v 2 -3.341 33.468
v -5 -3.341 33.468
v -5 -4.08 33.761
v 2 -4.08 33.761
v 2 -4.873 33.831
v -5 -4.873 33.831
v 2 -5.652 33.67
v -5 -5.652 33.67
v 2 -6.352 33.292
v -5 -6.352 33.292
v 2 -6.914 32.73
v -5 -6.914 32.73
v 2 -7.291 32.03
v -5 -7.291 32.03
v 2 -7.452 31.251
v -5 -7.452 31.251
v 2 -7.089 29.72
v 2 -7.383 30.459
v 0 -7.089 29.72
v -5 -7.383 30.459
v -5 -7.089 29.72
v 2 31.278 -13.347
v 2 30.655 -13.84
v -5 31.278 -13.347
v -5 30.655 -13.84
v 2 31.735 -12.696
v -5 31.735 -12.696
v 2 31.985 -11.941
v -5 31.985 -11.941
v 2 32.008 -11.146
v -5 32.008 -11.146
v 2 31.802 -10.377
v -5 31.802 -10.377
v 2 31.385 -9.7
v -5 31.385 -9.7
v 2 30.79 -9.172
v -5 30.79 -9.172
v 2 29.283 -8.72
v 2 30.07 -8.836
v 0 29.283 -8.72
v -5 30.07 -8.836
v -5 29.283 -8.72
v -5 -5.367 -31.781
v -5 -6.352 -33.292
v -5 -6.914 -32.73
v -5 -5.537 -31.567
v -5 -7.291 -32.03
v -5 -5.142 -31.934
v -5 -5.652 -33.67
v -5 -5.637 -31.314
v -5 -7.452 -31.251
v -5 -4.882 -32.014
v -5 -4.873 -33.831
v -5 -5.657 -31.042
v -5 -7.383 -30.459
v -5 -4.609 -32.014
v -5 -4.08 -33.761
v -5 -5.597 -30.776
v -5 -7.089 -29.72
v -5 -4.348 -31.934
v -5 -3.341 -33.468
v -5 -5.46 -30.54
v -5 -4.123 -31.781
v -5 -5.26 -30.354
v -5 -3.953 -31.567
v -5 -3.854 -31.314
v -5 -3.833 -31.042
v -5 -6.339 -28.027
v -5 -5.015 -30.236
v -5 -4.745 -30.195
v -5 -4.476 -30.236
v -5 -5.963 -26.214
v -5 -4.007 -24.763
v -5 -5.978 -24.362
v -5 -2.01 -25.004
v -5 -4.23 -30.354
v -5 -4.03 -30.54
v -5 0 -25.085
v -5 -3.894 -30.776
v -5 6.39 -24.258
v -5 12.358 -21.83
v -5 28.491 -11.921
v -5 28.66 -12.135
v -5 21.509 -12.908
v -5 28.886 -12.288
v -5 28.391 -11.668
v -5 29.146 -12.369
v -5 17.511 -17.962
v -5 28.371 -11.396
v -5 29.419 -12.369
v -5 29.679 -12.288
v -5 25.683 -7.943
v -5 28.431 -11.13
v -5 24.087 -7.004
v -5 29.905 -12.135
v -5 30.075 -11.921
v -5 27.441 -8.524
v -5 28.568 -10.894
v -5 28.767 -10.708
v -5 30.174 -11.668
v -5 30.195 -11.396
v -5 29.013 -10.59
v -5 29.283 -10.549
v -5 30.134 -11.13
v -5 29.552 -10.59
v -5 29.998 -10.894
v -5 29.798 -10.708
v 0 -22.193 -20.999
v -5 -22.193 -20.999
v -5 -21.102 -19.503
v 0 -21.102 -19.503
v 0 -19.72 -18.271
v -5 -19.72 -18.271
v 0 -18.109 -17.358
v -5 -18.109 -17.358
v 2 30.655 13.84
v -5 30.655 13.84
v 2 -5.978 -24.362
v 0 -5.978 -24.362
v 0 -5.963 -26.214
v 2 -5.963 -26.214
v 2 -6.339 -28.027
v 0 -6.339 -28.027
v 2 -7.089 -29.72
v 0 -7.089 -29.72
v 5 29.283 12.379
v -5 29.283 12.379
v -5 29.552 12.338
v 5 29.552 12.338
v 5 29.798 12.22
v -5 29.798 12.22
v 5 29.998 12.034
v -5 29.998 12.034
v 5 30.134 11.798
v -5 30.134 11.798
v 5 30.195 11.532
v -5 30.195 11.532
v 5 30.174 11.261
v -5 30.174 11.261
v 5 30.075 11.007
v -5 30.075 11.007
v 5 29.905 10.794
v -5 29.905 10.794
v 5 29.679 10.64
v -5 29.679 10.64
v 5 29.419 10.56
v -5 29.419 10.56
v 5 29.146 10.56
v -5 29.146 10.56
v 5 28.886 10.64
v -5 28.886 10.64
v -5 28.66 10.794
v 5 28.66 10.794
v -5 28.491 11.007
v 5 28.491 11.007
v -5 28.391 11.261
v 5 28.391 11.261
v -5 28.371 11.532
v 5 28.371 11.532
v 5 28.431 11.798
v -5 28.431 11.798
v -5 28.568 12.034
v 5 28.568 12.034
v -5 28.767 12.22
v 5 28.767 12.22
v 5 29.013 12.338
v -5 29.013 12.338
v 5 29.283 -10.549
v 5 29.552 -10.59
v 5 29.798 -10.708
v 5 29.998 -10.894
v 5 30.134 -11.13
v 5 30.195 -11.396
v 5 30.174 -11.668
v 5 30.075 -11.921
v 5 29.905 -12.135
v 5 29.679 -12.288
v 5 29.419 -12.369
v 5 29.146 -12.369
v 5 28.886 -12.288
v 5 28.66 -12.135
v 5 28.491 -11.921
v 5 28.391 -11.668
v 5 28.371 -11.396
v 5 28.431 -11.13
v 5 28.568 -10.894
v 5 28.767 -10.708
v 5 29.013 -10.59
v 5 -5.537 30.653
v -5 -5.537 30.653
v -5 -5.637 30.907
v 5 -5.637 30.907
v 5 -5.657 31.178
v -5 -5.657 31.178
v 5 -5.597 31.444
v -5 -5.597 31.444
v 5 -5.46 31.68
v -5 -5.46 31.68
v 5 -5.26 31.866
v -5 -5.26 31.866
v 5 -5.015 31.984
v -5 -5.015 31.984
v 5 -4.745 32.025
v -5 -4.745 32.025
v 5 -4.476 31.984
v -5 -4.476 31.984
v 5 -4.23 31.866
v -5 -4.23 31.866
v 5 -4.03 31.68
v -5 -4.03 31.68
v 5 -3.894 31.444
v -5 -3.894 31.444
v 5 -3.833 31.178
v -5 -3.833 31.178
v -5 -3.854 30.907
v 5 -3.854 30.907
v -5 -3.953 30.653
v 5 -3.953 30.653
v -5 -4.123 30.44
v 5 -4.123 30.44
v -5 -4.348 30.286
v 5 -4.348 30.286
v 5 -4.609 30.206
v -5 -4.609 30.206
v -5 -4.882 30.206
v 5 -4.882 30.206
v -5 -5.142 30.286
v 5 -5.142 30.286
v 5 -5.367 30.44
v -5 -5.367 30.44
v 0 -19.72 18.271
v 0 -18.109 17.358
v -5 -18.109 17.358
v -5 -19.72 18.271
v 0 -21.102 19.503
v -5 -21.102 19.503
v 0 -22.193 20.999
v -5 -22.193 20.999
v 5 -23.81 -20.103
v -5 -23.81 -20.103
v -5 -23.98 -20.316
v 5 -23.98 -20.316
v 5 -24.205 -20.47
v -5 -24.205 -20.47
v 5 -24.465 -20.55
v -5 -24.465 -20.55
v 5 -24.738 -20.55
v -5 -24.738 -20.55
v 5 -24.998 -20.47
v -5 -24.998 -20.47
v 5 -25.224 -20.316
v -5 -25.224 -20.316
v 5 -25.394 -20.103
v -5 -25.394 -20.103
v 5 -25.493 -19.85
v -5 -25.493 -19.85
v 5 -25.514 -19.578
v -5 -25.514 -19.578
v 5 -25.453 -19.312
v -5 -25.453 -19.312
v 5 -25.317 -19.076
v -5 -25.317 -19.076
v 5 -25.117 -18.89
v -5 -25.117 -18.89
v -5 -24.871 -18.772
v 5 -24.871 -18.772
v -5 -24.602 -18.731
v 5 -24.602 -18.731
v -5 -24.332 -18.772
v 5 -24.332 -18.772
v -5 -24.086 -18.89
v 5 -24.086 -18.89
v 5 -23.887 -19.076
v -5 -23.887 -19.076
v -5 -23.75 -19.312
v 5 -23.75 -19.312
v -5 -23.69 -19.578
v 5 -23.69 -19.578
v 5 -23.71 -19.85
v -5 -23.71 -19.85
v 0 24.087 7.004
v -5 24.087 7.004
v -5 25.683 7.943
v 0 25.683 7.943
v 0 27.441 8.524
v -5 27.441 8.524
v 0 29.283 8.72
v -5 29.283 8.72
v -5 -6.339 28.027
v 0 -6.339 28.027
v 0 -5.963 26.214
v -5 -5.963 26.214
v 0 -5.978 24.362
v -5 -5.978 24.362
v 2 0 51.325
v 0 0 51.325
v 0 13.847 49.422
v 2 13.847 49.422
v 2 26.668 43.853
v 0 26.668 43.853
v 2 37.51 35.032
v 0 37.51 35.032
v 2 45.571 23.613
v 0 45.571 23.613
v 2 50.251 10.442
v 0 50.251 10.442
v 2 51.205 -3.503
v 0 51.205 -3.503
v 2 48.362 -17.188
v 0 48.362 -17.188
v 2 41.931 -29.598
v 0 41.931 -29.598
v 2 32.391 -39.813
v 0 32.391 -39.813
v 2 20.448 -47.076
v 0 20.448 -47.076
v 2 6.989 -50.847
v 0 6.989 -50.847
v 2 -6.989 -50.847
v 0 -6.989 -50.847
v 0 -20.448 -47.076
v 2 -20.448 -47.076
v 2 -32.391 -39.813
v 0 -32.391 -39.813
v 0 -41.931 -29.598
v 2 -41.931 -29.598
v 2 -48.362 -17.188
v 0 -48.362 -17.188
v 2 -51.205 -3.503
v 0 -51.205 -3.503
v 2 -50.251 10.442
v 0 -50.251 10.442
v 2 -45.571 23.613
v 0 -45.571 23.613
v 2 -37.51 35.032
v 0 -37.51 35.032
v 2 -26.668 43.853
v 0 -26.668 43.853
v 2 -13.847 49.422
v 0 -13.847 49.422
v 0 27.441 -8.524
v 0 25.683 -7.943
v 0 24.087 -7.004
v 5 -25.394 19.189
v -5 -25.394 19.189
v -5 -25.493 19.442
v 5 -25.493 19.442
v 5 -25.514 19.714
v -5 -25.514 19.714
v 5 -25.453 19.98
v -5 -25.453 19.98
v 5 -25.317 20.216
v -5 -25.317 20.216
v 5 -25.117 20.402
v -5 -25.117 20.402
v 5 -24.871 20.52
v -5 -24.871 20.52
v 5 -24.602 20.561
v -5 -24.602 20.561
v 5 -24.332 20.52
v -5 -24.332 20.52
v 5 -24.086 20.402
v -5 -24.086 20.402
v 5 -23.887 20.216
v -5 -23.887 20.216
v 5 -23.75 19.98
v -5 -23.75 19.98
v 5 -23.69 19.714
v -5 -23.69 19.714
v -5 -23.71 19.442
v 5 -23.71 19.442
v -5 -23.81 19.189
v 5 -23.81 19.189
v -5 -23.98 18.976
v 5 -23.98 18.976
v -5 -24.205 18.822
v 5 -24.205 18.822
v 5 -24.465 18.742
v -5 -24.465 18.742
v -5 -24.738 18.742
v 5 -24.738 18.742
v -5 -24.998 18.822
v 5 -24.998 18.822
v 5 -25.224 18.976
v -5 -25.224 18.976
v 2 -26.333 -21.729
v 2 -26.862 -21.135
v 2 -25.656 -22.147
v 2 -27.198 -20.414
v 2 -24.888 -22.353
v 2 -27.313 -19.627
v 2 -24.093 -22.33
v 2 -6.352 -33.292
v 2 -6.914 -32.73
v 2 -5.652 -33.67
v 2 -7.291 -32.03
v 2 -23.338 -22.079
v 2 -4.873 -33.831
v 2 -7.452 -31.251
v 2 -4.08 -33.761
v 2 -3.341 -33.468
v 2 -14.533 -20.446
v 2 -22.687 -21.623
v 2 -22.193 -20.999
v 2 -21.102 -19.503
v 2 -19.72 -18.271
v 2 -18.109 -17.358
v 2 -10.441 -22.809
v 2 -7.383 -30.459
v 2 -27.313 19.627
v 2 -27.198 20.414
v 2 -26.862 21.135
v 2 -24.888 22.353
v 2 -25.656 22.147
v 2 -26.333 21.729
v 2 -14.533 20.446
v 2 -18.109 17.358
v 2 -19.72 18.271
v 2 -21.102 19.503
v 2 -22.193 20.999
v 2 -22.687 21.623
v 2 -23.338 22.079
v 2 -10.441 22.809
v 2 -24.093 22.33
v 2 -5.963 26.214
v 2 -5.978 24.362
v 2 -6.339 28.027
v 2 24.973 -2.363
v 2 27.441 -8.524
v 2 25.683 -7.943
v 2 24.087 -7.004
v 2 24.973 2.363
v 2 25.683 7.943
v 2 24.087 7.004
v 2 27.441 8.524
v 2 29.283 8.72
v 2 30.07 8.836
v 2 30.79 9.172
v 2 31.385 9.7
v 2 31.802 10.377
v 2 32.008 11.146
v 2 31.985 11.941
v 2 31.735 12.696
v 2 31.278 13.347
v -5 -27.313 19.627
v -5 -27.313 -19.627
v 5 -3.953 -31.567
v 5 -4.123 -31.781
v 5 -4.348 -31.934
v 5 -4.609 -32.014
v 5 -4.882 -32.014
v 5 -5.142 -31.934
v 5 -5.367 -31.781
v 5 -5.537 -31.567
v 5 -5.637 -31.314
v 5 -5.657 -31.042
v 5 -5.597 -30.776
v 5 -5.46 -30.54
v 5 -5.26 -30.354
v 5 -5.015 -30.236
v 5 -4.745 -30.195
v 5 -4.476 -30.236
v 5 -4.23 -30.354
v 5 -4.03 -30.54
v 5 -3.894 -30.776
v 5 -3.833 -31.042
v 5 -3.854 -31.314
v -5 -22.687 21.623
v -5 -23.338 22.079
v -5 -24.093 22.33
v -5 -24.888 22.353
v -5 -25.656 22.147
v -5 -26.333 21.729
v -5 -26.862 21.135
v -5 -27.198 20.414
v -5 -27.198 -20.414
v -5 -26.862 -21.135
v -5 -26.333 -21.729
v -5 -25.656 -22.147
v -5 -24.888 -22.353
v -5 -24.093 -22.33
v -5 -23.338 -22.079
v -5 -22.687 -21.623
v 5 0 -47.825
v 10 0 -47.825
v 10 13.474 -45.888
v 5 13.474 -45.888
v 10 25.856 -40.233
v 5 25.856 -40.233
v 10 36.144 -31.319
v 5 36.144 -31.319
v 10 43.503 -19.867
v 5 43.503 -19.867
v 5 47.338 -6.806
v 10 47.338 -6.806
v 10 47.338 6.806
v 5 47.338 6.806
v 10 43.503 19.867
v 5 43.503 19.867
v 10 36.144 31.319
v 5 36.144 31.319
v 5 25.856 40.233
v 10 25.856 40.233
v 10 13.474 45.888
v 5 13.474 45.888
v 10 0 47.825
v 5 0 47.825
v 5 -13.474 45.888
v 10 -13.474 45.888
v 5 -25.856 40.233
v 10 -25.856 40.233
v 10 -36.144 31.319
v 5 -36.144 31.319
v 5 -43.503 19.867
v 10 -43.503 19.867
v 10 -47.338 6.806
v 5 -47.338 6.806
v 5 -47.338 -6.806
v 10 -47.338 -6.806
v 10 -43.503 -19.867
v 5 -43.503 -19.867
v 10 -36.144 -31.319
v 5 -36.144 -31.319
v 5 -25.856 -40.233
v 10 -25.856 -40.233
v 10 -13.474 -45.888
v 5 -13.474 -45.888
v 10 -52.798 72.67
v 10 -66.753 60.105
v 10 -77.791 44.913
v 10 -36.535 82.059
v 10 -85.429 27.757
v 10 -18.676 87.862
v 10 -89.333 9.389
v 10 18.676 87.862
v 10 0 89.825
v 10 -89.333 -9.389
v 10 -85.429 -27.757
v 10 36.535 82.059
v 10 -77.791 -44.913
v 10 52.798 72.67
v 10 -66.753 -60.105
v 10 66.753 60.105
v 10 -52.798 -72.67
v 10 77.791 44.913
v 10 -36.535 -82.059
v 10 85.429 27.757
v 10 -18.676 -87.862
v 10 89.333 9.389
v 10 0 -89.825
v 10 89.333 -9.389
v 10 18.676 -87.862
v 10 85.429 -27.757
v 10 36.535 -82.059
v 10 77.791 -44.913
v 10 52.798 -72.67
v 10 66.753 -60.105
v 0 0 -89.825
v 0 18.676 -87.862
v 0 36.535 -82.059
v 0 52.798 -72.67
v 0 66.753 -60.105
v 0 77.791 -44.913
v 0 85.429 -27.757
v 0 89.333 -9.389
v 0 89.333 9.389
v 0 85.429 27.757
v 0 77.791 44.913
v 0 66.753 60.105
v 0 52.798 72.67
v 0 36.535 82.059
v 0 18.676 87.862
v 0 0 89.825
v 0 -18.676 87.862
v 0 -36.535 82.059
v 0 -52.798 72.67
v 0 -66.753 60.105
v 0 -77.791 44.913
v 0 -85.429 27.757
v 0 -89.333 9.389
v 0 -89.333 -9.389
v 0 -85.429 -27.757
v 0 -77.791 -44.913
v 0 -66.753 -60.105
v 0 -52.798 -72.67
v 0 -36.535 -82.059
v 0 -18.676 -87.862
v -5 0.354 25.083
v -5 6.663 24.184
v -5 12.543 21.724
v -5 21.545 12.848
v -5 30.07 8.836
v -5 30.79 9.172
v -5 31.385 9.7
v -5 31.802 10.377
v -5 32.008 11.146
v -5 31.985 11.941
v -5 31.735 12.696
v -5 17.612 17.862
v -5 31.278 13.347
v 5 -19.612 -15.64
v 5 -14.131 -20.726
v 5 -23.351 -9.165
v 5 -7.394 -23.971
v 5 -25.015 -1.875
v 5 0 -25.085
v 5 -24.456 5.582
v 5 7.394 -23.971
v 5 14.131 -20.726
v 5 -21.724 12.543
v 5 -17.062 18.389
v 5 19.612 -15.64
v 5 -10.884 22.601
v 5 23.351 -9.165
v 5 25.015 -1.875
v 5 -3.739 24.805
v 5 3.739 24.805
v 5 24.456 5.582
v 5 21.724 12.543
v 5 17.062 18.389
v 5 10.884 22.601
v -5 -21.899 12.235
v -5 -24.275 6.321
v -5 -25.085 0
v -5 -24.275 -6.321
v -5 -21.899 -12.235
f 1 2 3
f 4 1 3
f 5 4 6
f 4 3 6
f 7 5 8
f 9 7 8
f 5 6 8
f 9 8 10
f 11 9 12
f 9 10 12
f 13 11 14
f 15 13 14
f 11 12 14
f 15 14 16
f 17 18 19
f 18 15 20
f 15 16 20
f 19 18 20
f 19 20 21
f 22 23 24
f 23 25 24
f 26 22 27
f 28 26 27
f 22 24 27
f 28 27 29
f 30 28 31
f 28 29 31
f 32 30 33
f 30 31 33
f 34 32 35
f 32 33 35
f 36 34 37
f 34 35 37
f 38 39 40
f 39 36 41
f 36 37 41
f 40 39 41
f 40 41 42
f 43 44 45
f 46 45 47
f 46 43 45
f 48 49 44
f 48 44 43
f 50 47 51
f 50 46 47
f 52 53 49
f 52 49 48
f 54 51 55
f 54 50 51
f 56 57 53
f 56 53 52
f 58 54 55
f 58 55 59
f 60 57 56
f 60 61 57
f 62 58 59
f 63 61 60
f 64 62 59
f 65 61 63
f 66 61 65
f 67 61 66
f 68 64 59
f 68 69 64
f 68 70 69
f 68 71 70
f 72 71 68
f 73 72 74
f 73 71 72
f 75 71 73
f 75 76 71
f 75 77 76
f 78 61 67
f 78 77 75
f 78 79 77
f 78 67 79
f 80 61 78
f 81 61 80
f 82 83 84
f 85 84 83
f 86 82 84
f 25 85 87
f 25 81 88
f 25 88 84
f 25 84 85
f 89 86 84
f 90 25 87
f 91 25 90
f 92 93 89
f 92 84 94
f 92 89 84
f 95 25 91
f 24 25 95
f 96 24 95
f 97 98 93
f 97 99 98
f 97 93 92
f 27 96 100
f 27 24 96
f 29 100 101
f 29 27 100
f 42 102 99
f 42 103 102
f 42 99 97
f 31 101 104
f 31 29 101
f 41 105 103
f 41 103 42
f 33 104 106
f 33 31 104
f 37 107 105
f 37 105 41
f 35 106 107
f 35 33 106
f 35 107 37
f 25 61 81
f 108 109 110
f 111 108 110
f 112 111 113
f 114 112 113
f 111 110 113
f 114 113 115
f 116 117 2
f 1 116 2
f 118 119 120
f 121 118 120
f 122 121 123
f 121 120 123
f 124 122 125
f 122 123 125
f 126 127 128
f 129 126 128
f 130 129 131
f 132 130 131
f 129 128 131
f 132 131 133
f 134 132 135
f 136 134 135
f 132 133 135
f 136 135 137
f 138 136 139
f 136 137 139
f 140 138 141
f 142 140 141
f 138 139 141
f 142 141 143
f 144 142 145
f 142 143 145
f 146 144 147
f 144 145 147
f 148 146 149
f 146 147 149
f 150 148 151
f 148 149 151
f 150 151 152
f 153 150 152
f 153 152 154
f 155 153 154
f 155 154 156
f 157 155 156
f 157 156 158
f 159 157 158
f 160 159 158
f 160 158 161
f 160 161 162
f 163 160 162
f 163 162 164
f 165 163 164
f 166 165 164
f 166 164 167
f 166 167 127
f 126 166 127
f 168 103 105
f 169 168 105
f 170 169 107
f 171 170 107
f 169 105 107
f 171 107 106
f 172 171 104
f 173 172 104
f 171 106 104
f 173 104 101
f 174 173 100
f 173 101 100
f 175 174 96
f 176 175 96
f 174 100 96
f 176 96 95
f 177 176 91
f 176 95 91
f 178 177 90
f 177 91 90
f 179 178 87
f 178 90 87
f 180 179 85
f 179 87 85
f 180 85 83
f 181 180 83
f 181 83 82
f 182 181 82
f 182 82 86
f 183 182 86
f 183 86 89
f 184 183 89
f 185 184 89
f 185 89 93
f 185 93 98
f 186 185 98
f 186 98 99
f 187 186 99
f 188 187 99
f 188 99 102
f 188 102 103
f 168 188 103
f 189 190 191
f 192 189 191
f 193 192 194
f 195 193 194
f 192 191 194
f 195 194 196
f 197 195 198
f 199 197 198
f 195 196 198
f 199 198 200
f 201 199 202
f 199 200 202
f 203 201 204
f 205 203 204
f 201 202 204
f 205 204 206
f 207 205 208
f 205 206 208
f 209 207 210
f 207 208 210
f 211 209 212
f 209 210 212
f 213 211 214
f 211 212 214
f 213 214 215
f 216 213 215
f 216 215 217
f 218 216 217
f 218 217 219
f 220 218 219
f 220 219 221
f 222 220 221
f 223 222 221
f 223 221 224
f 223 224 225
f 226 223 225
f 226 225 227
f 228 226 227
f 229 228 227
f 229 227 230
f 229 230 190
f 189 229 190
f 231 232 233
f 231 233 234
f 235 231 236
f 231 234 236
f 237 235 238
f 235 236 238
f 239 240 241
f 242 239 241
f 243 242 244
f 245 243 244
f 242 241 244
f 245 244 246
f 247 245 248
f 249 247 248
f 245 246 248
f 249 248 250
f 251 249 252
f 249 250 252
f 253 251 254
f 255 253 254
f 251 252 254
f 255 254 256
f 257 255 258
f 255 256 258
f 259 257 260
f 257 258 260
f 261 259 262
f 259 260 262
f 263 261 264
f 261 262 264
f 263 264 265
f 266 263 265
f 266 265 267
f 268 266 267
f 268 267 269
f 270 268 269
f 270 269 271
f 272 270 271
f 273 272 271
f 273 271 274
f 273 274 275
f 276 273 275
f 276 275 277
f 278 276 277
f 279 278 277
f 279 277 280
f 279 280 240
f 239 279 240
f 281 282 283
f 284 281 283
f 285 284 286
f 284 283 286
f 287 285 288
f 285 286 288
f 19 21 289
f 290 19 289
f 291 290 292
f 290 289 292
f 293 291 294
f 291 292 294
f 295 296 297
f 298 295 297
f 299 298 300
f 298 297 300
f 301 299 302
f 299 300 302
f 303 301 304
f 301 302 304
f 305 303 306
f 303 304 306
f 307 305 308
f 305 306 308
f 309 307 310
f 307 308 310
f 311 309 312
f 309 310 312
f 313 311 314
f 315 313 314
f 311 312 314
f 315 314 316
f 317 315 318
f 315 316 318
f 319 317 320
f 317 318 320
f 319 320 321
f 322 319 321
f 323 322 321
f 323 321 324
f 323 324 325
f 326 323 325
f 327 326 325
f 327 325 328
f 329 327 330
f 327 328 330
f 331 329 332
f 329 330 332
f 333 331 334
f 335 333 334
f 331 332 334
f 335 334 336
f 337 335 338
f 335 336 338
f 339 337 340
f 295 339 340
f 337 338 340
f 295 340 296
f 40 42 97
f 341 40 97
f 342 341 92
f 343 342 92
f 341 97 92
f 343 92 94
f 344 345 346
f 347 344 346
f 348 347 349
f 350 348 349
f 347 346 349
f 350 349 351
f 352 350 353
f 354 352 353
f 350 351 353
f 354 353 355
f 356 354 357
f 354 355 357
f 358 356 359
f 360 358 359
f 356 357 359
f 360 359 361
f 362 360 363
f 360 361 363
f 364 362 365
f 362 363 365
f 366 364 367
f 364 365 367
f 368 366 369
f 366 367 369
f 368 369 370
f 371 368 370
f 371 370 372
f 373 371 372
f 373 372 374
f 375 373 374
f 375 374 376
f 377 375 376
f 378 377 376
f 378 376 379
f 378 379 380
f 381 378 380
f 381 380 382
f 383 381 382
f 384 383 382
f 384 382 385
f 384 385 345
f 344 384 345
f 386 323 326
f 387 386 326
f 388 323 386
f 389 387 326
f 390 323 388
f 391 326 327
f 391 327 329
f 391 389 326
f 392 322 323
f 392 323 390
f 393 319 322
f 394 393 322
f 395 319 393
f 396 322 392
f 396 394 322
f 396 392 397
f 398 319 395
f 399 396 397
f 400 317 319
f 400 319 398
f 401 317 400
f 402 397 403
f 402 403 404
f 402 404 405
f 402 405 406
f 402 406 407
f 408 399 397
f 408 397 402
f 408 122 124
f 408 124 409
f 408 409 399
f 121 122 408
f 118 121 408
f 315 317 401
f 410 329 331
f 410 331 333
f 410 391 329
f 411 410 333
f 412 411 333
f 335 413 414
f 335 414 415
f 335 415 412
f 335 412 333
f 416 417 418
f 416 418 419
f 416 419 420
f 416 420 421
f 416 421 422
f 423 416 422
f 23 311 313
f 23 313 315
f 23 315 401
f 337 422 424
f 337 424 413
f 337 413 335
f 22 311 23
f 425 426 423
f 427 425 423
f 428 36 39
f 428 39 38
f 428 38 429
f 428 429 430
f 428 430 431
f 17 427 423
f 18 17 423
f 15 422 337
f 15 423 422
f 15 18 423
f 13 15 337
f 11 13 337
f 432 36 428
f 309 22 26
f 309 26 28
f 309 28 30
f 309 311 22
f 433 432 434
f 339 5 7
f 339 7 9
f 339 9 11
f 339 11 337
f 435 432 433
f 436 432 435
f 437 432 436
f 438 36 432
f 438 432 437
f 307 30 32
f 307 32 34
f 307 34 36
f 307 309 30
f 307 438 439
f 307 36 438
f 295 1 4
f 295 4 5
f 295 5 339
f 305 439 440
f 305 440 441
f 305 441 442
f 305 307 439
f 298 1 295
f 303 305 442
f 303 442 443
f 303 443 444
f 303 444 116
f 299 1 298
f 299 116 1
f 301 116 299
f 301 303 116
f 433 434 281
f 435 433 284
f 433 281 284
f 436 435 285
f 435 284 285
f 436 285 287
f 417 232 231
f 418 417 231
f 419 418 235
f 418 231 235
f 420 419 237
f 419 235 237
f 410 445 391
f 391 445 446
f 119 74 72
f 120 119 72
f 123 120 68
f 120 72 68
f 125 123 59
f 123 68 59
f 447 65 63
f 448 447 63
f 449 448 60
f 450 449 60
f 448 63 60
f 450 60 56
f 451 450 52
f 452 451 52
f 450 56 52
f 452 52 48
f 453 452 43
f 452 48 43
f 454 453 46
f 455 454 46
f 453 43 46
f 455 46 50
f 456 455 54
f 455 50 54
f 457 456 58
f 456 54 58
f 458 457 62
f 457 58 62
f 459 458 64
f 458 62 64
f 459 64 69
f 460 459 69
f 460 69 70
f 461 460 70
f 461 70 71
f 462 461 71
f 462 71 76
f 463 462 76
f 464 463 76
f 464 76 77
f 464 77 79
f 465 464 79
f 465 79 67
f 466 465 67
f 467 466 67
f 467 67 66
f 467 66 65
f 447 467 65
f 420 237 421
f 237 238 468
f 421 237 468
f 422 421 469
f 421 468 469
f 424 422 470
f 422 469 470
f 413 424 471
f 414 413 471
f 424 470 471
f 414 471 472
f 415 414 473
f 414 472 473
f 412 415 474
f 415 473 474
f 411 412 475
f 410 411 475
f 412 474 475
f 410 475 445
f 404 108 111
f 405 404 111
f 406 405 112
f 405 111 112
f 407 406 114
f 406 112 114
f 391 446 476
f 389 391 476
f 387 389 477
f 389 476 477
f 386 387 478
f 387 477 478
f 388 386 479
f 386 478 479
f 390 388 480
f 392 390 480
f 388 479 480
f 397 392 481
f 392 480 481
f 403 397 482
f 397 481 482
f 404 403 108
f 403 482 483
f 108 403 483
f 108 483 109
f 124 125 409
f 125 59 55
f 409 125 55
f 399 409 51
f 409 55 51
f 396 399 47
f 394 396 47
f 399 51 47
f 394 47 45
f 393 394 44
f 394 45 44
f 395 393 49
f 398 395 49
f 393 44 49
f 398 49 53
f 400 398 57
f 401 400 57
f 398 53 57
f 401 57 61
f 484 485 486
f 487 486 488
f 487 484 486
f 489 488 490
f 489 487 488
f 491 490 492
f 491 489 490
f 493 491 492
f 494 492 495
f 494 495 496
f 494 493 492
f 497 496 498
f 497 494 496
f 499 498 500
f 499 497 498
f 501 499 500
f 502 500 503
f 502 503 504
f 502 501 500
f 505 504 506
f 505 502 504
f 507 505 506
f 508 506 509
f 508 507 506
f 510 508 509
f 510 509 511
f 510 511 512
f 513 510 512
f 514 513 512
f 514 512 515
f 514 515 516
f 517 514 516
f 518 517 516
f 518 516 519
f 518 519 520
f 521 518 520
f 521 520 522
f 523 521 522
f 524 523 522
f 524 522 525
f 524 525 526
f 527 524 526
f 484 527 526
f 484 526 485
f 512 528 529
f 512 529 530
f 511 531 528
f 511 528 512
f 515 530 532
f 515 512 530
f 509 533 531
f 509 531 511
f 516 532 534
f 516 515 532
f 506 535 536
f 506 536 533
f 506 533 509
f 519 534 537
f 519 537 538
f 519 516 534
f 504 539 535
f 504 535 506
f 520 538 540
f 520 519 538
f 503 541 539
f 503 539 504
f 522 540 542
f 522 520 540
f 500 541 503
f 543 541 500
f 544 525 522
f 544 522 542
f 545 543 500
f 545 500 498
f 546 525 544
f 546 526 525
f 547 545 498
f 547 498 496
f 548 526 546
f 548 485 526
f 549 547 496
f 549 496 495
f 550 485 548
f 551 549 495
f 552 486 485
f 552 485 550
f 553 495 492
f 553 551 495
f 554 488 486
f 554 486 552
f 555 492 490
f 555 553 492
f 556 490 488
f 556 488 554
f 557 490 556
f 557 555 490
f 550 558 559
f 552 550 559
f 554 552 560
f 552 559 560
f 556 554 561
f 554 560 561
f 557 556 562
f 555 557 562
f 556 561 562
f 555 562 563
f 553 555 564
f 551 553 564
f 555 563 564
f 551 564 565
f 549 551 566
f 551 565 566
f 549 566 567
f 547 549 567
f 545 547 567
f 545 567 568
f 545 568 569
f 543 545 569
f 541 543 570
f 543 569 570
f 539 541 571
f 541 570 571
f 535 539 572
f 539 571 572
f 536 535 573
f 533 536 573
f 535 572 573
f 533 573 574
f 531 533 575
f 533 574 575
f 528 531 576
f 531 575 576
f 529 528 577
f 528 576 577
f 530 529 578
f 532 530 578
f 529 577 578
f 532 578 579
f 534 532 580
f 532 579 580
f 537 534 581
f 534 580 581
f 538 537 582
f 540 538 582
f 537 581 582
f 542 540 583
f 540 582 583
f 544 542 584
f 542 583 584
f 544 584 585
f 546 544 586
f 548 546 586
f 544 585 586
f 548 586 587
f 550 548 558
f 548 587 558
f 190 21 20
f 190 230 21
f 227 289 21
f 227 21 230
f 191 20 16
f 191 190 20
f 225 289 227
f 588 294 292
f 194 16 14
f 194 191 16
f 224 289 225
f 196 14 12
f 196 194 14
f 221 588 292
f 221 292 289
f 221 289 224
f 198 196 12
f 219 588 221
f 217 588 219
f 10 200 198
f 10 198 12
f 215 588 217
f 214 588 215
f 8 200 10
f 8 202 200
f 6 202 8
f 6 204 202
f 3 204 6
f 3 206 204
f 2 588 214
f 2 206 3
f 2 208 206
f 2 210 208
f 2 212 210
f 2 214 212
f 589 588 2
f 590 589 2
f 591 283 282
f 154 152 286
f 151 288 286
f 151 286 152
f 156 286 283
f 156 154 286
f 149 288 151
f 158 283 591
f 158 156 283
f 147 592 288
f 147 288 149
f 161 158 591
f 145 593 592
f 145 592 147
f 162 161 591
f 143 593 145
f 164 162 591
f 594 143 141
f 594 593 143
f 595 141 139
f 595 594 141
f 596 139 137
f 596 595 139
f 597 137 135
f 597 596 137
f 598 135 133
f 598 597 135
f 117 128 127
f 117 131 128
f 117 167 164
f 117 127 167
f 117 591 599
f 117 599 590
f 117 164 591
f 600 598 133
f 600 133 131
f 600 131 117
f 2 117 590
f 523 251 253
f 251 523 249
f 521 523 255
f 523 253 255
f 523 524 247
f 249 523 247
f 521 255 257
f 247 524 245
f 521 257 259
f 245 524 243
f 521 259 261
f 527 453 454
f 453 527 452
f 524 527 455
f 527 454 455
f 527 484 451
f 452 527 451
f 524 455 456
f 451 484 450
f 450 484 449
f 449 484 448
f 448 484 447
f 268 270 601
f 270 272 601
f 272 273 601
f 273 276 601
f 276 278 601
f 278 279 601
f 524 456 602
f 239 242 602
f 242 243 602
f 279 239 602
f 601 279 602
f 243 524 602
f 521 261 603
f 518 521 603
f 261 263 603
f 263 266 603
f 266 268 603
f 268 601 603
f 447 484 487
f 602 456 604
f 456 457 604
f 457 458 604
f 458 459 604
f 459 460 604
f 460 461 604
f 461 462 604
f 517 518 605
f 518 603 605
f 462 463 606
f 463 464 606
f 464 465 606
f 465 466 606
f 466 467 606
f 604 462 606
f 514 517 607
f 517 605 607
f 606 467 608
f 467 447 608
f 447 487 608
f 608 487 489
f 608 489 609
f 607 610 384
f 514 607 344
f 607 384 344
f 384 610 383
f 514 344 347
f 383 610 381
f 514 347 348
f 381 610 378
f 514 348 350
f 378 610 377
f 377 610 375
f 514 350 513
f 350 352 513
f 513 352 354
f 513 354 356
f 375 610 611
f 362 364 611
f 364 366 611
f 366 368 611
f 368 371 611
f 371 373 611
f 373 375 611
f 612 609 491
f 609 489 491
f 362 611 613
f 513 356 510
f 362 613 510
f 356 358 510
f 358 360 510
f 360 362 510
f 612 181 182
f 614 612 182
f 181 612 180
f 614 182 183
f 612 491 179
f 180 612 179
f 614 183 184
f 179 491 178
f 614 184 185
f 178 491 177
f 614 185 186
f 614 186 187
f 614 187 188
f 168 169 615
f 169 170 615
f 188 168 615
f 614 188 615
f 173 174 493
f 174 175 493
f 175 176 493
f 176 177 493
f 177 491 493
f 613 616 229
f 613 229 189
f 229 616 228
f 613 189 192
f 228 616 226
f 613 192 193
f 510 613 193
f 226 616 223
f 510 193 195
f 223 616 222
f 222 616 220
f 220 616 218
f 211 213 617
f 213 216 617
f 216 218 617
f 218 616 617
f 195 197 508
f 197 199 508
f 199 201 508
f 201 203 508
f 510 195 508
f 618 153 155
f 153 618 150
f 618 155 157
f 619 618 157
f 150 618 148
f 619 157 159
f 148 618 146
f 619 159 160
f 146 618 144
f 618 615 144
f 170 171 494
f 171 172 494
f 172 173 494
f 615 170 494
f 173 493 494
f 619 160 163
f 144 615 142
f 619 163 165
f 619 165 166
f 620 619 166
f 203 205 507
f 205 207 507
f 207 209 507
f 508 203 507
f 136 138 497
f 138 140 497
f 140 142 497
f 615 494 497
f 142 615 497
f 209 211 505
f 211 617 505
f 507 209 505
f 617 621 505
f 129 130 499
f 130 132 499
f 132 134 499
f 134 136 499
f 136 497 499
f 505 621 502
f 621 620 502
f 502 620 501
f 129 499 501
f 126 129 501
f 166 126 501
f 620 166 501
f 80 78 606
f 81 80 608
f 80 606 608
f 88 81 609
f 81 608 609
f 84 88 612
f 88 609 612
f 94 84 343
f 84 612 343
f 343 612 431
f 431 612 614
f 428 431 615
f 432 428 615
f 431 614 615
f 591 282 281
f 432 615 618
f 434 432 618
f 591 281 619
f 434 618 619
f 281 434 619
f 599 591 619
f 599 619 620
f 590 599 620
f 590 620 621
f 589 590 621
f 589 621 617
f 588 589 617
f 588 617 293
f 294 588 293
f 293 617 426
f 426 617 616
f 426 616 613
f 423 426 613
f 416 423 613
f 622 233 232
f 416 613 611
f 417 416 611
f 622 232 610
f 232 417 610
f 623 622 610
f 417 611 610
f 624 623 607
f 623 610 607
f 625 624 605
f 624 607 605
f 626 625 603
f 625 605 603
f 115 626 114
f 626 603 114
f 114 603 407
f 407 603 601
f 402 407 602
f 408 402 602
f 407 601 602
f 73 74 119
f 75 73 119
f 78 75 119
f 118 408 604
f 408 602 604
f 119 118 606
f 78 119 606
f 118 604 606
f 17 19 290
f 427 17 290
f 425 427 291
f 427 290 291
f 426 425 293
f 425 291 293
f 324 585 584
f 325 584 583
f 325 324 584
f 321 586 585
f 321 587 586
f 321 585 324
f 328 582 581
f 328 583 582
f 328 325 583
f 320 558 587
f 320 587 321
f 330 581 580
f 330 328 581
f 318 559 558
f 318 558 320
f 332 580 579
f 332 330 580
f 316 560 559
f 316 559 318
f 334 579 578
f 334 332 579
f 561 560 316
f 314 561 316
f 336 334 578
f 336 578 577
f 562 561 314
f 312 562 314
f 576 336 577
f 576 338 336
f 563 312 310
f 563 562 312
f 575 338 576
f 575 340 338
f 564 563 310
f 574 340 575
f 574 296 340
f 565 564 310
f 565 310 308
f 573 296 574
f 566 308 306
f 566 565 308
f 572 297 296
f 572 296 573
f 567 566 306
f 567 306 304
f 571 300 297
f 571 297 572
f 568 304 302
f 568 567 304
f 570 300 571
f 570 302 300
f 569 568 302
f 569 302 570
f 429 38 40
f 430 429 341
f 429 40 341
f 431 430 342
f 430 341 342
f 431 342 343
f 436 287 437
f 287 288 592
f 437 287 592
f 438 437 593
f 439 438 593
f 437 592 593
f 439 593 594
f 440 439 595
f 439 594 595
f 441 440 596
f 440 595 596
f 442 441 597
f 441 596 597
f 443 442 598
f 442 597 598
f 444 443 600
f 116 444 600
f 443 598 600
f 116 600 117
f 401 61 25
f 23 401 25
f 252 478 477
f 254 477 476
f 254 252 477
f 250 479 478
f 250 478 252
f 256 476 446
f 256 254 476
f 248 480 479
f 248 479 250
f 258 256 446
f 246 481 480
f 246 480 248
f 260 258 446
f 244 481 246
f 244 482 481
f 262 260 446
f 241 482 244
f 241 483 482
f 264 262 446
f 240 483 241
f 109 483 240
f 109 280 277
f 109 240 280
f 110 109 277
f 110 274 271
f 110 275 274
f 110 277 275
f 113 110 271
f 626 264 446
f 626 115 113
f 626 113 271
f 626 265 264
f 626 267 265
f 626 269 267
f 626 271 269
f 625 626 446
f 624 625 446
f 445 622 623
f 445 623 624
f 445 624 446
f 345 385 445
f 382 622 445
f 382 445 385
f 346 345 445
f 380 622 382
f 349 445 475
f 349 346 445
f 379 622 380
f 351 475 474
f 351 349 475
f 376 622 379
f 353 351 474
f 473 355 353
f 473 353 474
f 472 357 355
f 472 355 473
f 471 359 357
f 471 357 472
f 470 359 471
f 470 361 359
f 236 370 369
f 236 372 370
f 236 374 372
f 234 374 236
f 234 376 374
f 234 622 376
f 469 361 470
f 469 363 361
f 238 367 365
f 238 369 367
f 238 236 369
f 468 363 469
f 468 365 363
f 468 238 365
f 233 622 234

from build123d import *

# Parameters (mm, degrees)
SKETCH1_R                   = 89.825
SKETCH1_R_2                 = 47.825
BOSS_EXTRUDE1_DEPTH         = 10
SKETCH3_R                   = 47.825
TBH_IDK_DEPTH               = 5
EXTRUSION_START             = 5
SKETCH4_R                   = 47.825
EXTRUSION_TO_FUEL_MAN_DEPTH = 5
OX_DOWNCOMER_REACH          = 129.914
OX_PROFILE_R                = 0.914623685
OX_ORIFICES_COUNT           = 3
SKETCH7_R                   = 47.825
FUEL_BLOCKERS_DEPTH         = 5
SKETCH8_R                   = 25.085
TI_CUT_EXTRUDE_DEPTH        = 128.424727781
SKETCH9_R                   = 51.325
FUEL_VOLUME_DEPTH           = 2


with BuildPart() as part:
    # Sketch1 → Boss-Extrude1 (new body)
    with BuildSketch(Plane(origin=(0, 0, 0), x_dir=(0, 0, -1), z_dir=(1, 0, 0))):
        Circle(SKETCH1_R)
        Circle(SKETCH1_R_2, mode=Mode.SUBTRACT)
    extrude(amount=BOSS_EXTRUDE1_DEPTH)

    # Sketch3 → tbh idk (add)
    with BuildSketch(Plane.ZY):
        Circle(SKETCH3_R)
    extrude(amount=-TBH_IDK_DEPTH)

    # Sketch4 → Extrusion to Fuel Man (add)
    with BuildSketch(Plane.ZY.offset(EXTRUSION_START)):
        Circle(SKETCH4_R)
    extrude(amount=-EXTRUSION_TO_FUEL_MAN_DEPTH)

    # Ox Profile → Ox Downcomer (cut, up to next)
    with BuildSketch(Plane.ZY.offset(5), mode=Mode.PRIVATE) as ox_downcomer_sk1:
        with Locations((11.464101615, 29.2826)):
            Circle(OX_PROFILE_R)
    ox_downcomer_tool1 = extrude(ox_downcomer_sk1.sketch, amount=-OX_DOWNCOMER_REACH, mode=Mode.PRIVATE) & part.part
    # Ox Profile → Ox Downcomer (cut, up to next)
    with BuildSketch(Plane.ZY.offset(5), mode=Mode.PRIVATE) as ox_downcomer_sk2:
        with Locations((-11.464101615, 29.2826)):
            Circle(OX_PROFILE_R)
    ox_downcomer_tool2 = extrude(ox_downcomer_sk2.sketch, amount=-OX_DOWNCOMER_REACH, mode=Mode.PRIVATE) & part.part
    ox_downcomer_1 = ox_downcomer_tool1.solids().sort_by_distance((-5, 29.2826, 11.464102))[0]
    add(ox_downcomer_1, mode=Mode.SUBTRACT)
    ox_downcomer_2 = ox_downcomer_tool2.solids().sort_by_distance((-5, 29.2826, -11.464102))[0]
    add(ox_downcomer_2, mode=Mode.SUBTRACT)
    ox_downcomer = ox_downcomer_1 + ox_downcomer_2  # Ox Downcomer as one shape, for the pattern or mirror that repeats it

    # Ox Orifices: Ox Downcomer ×3 about axis
    ox_orifices_axis = Axis((0, -0.021435438, 0), (1, 0, 0))
    for i in range(1, OX_ORIFICES_COUNT):
        add(ox_downcomer.rotate(ox_orifices_axis, i * 360 / OX_ORIFICES_COUNT), mode=Mode.SUBTRACT)

    # Sketch7 → Fuel Blockers (cut)
    with BuildSketch(Plane.ZY.offset(5)):
        Circle(SKETCH7_R)
        with BuildLine():
            Line((-33.467788335, -3.341161242), (-13.840363653, 30.654535527))
            ThreePointArc((-13.840363653, 30.654535527), (-10.753935529, 31.932975916), (-8.72023056, 29.2826))
            ThreePointArc((-8.72023056, 29.2826), (0, 20.56236944), (8.72023056, 29.2826))
            ThreePointArc((8.72023056, 29.2826), (10.753935529, 31.932975916), (13.840363653, 30.654535527))
            Line((13.840363653, 30.654535527), (33.467788335, -3.341161242))
            ThreePointArc((33.467788335, -3.341161242), (33.031736126, -6.653306599), (29.719590769, -7.089358808))
            ThreePointArc((29.719590769, -7.089358808), (17.807534297, -10.28118472), (20.999360209, -22.193241192))
            ThreePointArc((20.999360209, -22.193241192), (22.277800597, -25.279669317), (19.627424681, -27.313374285))
            Line((19.627424681, -27.313374285), (-19.627424681, -27.313374285))
            ThreePointArc((-19.627424681, -27.313374285), (-22.277800597, -25.279669317), (-20.999360209, -22.193241192))
            ThreePointArc((-20.999360209, -22.193241192), (-17.807534297, -10.28118472), (-29.719590769, -7.089358808))
            ThreePointArc((-29.719590769, -7.089358808), (-33.031736126, -6.653306599), (-33.467788335, -3.341161242))
        make_face(mode=Mode.SUBTRACT)
    extrude(amount=-FUEL_BLOCKERS_DEPTH, mode=Mode.SUBTRACT)

    # Sketch8 → TI Cut Extrude (cut, through all)
    with BuildSketch(Plane(origin=(5, 0, 0), x_dir=(0, 0, -1), z_dir=(1, 0, 0))):
        Circle(SKETCH8_R)
    extrude(amount=-TI_CUT_EXTRUDE_DEPTH, mode=Mode.SUBTRACT)

    # Sketch9 → Fuel Volume (cut)
    with BuildSketch(Plane.ZY):
        Circle(SKETCH9_R)
        with BuildLine():
            ThreePointArc((-13.840363653, 30.654535527), (-10.753935529, 31.932975916), (-8.72023056, 29.2826))
            ThreePointArc((-8.72023056, 29.2826), (-8.280001273, 26.546909971), (-7.003762198, 24.087435315))
            ThreePointArc((-7.003762198, 24.087435315), (0, 25.085), (7.003762198, 24.087435315))
            ThreePointArc((7.003762198, 24.087435315), (8.280001273, 26.546909971), (8.72023056, 29.2826))
            ThreePointArc((8.72023056, 29.2826), (10.753935529, 31.932975916), (13.840363653, 30.654535527))
            Line((13.840363653, 30.654535527), (33.467788335, -3.341161242))
            ThreePointArc((33.467788335, -3.341161242), (33.031736126, -6.653306599), (29.719590769, -7.089358808))
            ThreePointArc((29.719590769, -7.089358808), (27.130299064, -6.102763539), (24.362211994, -5.978281672))
            ThreePointArc((24.362211994, -5.978281672), (21.724247254, -12.5425), (17.358449796, -18.109153643))
            ThreePointArc((17.358449796, -18.109153643), (18.85029779, -20.444146432), (20.999360209, -22.193241192))
            ThreePointArc((20.999360209, -22.193241192), (22.277800597, -25.279669317), (19.627424681, -27.313374285))
            Line((19.627424681, -27.313374285), (-19.627424681, -27.313374285))
            ThreePointArc((-19.627424681, -27.313374285), (-22.277800597, -25.279669317), (-20.999360209, -22.193241192))
            ThreePointArc((-20.999360209, -22.193241192), (-18.85029779, -20.444146432), (-17.358449796, -18.109153643))
            ThreePointArc((-17.358449796, -18.109153643), (-21.724247254, -12.5425), (-24.362211994, -5.978281672))
            ThreePointArc((-24.362211994, -5.978281672), (-27.130299064, -6.102763539), (-29.719590769, -7.089358808))
            ThreePointArc((-29.719590769, -7.089358808), (-33.031736126, -6.653306599), (-33.467788335, -3.341161242))
            Line((-33.467788335, -3.341161242), (-13.840363653, 30.654535527))
        make_face(mode=Mode.SUBTRACT)
    extrude(amount=-FUEL_VOLUME_DEPTH, mode=Mode.SUBTRACT)


solid = part.part
